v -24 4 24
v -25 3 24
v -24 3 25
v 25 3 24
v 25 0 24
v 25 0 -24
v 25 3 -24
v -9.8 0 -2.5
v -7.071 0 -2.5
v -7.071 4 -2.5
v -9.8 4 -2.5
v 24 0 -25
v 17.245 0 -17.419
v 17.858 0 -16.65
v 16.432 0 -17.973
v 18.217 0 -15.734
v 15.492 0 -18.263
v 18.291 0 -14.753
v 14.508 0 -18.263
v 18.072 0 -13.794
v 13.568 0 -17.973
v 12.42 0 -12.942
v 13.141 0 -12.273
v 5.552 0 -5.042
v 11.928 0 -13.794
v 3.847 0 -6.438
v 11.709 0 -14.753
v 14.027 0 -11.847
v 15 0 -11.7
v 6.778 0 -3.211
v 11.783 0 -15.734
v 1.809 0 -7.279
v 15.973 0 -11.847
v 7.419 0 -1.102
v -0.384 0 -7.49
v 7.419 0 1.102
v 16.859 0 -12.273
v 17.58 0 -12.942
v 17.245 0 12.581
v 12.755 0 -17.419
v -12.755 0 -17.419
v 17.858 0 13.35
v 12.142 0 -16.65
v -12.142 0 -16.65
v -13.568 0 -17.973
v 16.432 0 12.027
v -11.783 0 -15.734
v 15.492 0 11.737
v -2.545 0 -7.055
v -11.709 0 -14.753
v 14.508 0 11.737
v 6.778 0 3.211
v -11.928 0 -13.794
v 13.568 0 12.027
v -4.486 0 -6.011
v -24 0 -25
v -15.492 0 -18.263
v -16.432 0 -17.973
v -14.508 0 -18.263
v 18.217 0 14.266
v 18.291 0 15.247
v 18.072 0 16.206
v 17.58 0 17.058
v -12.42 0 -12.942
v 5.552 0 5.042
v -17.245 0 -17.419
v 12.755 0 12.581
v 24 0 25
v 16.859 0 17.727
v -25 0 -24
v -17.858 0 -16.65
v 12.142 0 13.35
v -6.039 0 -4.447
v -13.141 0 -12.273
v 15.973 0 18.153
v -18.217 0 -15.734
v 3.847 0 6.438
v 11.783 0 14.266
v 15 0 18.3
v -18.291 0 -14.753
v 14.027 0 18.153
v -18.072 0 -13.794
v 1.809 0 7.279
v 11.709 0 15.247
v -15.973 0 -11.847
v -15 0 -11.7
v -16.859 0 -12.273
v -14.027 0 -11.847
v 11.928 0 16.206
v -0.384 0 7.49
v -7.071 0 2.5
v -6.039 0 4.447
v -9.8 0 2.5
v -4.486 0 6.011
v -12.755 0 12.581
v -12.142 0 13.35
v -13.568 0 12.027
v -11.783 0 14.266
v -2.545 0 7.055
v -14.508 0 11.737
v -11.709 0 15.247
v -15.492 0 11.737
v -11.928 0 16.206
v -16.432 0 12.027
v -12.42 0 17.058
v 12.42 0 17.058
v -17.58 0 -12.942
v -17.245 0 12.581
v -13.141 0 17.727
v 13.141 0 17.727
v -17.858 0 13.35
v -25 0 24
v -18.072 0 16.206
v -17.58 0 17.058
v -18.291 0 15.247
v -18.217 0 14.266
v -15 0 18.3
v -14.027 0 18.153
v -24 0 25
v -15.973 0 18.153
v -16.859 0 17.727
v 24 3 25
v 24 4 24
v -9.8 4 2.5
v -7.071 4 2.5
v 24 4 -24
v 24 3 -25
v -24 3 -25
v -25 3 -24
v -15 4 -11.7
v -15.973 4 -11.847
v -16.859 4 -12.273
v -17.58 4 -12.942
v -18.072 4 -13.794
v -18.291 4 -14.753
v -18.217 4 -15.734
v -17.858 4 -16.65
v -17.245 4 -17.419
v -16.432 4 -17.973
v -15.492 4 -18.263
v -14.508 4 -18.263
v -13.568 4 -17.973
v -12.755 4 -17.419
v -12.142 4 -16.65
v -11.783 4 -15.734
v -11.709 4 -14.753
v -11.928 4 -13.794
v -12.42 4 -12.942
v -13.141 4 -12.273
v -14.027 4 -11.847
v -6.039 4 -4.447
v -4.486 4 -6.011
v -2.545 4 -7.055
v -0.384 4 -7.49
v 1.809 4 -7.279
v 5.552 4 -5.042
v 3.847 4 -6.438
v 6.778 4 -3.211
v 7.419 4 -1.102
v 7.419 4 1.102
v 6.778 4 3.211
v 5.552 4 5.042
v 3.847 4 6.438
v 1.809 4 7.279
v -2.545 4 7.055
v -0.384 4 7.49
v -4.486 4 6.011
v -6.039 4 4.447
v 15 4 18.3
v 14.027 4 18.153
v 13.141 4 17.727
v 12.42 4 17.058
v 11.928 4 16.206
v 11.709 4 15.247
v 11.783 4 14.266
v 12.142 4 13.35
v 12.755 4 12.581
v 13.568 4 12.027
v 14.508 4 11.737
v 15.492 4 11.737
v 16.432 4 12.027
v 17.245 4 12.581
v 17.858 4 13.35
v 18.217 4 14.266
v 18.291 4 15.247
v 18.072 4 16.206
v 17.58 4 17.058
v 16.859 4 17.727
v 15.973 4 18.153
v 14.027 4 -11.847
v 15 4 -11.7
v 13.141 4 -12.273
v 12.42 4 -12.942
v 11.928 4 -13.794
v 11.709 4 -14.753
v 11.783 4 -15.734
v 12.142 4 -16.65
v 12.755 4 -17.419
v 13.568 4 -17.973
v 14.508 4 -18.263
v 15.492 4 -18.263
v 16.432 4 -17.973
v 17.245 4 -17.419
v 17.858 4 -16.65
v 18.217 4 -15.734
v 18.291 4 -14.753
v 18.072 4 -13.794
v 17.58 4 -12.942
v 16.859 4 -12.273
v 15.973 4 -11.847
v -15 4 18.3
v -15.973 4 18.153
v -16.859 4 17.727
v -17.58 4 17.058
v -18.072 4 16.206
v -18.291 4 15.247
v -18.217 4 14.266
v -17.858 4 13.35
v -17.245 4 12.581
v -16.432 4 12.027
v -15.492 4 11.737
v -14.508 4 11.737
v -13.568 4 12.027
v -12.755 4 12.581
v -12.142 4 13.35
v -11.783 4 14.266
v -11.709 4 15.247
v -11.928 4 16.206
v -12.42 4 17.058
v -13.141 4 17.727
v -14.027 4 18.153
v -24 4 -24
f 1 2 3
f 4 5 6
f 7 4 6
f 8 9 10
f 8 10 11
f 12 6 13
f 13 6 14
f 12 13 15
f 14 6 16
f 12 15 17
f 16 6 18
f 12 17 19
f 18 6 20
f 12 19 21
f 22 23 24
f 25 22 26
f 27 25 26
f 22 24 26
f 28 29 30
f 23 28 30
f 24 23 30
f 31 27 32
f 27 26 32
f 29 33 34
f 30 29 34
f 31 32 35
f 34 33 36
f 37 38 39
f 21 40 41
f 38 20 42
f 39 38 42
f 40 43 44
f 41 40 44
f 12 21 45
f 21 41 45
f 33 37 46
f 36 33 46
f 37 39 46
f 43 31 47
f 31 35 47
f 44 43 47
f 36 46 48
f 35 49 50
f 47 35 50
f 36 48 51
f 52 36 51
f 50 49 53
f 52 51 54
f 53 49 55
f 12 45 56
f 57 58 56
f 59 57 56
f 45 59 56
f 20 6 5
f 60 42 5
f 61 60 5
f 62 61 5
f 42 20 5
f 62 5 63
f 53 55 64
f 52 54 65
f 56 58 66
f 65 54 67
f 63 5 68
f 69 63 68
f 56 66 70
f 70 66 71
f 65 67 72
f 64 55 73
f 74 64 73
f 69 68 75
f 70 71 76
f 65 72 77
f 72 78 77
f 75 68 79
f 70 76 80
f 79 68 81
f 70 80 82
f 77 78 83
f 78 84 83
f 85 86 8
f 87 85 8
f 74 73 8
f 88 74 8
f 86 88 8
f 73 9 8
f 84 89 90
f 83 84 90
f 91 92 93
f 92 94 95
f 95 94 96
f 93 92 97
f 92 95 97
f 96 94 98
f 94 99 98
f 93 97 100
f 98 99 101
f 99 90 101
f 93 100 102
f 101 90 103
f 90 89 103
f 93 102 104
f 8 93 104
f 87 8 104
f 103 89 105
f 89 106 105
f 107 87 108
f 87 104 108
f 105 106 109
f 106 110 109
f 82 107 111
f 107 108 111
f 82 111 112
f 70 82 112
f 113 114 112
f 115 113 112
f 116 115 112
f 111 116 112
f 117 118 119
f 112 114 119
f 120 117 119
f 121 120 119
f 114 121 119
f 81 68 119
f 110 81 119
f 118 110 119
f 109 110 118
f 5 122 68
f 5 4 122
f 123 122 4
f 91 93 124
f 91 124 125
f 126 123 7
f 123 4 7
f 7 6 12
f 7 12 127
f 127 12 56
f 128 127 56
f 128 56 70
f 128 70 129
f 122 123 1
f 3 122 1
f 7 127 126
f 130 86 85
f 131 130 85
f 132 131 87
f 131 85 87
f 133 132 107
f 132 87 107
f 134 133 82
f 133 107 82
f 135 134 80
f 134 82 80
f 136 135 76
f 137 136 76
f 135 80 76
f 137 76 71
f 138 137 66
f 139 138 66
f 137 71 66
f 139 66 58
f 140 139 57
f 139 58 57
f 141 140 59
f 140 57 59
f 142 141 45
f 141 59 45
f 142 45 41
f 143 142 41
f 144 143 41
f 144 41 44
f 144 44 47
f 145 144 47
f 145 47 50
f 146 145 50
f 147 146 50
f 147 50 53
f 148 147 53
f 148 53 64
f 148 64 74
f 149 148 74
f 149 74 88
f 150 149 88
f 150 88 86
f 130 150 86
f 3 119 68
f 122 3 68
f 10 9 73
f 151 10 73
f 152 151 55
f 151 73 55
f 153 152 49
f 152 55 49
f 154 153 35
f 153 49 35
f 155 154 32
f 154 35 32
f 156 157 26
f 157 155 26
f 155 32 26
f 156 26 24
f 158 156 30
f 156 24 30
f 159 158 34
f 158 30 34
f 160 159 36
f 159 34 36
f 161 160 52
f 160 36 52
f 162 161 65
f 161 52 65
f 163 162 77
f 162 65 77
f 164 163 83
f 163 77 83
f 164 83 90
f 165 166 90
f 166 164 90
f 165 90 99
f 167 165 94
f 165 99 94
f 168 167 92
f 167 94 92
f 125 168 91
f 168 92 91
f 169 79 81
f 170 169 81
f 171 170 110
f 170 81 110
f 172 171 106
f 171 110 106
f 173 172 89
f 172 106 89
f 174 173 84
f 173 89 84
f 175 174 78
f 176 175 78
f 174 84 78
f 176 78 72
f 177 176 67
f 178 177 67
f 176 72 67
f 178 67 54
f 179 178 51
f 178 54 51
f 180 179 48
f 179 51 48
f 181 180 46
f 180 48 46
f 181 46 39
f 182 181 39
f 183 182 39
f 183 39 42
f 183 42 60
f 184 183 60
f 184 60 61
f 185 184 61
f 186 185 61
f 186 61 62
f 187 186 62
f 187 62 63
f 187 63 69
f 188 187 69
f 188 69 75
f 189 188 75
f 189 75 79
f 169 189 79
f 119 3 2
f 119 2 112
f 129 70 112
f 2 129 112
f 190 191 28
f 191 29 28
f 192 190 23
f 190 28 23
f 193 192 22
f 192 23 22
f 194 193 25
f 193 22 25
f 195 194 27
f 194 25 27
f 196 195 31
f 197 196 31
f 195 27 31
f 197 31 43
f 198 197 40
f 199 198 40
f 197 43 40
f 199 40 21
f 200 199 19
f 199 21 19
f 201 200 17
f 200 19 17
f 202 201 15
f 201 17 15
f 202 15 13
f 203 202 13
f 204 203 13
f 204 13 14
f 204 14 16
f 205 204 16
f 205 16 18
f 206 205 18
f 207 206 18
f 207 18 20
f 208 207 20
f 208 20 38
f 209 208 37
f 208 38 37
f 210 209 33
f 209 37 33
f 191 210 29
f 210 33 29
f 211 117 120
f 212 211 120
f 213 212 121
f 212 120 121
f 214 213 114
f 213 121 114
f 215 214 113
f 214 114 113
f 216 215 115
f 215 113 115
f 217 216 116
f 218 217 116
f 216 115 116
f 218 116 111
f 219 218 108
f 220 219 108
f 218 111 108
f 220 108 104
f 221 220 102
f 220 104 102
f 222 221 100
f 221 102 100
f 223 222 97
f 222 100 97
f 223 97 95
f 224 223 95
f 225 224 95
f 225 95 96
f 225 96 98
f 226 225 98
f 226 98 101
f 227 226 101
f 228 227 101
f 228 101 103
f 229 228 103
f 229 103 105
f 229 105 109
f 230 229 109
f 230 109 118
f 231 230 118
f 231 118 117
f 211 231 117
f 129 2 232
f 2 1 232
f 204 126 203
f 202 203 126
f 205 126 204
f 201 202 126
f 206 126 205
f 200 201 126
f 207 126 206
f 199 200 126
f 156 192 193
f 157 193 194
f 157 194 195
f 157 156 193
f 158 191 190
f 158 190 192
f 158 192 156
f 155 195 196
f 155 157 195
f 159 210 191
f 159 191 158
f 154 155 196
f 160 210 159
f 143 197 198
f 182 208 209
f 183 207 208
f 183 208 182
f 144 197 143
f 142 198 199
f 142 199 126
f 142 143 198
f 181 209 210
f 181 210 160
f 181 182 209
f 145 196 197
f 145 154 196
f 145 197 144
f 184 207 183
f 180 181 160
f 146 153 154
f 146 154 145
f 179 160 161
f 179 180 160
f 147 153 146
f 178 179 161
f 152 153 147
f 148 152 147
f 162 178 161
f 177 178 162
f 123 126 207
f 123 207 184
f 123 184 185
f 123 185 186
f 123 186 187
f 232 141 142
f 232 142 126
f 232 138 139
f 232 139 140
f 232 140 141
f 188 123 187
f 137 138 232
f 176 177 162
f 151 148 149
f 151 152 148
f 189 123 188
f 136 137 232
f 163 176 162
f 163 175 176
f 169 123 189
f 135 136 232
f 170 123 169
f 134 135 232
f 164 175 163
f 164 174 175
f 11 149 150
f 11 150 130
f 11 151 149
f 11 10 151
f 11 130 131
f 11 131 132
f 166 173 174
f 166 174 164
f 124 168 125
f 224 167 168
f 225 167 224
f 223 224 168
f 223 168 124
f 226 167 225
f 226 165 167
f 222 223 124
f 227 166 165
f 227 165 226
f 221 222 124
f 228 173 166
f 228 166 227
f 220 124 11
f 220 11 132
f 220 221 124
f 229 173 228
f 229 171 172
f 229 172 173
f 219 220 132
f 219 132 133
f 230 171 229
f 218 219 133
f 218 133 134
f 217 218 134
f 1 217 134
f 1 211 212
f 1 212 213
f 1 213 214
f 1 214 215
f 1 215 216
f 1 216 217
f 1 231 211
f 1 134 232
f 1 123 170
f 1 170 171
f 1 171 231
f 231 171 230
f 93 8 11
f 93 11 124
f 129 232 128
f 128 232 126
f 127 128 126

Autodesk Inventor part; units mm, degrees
ref_plane "YZ Plane" through (0, 0, 0) normal (1, 0, 0) x (0, 1, 0)
ref_plane "XZ Plane" through (0, 0, 0) normal (0, 1, 0) x (-1, 0, 0)
ref_plane "XY Plane" through (0, 0, 0) normal (0, 0, 1) x (1, 0, 0)
sketch "Sketch1" plane through (0, 0, 0) normal (0, 1, 0) x (-1, 0, 0)
  line L0 (0, -14.0533) -> (0, 14.0533) construction
  line L1 (4.9803, 0) -> (-4.9803, 0) construction
  line L2 (25, 25) -> (-25, 25)
  line L3 (-25, 25) -> (-25, -25)
  line L4 (-25, -25) -> (25, -25)
  line L5 (25, -25) -> (25, 25)
  arc A0 (7.0711, 2.5) -> (7.0711, -2.5) centre (0, 0) ccw
  line L6 (9.8, 2.5) -> (7.0711, 2.5)
  line L7 (7.0711, -2.5) -> (9.8, -2.5)
  line L8 (9.8, -2.5) -> (9.8, 2.5)
  dimension "d0" = 50
  dimension "d1" = 15
  dimension "d18" = 5
  dimension "d19" = 9.8
extrude "Extrusion1" add sketch "Sketch1" along normal blind 4
sketch "Sketch2" plane through (0, 4, 0) normal (0, 1, 0) x (1, 0, 0)
  line L0 (25, 25) -> (-25, 25) projected
  line L1 (-25, 25) -> (-25, -25) projected
  line L2 (-25, -25) -> (25, -25) projected
  line L3 (25, -25) -> (25, 25) projected
  point P0 (0, 0)
  point P1 (-15, -15)
  point P2 (-15, 15)
  point P3 (15, 15)
  point P4 (15, -15)
  dimension "d4" = 10
  dimension "d5" = 10
  dimension "d6" = 10
  dimension "d7" = 10
hole "Hole1" at (-15, 4, 15) at (-15, 4, -15) at (15, 4, -15) at (15, 4, 15) direction (0, -1, 0) diameter 6.6 end through all clearance for "Hex Head Cap Screw DIN EN 24017" size "M6" standard "DIN"
chamfer "Chamfer1" distance 1 angle 45 8 edges at (-25, 2, 25) (25, 2, 25) (25, 2, -25) (0, 4, -25) (-25, 4, 0) (0, 4, 25) (25, 4, 0) (-25, 2, -25)
properties part number "FlanschV1"
